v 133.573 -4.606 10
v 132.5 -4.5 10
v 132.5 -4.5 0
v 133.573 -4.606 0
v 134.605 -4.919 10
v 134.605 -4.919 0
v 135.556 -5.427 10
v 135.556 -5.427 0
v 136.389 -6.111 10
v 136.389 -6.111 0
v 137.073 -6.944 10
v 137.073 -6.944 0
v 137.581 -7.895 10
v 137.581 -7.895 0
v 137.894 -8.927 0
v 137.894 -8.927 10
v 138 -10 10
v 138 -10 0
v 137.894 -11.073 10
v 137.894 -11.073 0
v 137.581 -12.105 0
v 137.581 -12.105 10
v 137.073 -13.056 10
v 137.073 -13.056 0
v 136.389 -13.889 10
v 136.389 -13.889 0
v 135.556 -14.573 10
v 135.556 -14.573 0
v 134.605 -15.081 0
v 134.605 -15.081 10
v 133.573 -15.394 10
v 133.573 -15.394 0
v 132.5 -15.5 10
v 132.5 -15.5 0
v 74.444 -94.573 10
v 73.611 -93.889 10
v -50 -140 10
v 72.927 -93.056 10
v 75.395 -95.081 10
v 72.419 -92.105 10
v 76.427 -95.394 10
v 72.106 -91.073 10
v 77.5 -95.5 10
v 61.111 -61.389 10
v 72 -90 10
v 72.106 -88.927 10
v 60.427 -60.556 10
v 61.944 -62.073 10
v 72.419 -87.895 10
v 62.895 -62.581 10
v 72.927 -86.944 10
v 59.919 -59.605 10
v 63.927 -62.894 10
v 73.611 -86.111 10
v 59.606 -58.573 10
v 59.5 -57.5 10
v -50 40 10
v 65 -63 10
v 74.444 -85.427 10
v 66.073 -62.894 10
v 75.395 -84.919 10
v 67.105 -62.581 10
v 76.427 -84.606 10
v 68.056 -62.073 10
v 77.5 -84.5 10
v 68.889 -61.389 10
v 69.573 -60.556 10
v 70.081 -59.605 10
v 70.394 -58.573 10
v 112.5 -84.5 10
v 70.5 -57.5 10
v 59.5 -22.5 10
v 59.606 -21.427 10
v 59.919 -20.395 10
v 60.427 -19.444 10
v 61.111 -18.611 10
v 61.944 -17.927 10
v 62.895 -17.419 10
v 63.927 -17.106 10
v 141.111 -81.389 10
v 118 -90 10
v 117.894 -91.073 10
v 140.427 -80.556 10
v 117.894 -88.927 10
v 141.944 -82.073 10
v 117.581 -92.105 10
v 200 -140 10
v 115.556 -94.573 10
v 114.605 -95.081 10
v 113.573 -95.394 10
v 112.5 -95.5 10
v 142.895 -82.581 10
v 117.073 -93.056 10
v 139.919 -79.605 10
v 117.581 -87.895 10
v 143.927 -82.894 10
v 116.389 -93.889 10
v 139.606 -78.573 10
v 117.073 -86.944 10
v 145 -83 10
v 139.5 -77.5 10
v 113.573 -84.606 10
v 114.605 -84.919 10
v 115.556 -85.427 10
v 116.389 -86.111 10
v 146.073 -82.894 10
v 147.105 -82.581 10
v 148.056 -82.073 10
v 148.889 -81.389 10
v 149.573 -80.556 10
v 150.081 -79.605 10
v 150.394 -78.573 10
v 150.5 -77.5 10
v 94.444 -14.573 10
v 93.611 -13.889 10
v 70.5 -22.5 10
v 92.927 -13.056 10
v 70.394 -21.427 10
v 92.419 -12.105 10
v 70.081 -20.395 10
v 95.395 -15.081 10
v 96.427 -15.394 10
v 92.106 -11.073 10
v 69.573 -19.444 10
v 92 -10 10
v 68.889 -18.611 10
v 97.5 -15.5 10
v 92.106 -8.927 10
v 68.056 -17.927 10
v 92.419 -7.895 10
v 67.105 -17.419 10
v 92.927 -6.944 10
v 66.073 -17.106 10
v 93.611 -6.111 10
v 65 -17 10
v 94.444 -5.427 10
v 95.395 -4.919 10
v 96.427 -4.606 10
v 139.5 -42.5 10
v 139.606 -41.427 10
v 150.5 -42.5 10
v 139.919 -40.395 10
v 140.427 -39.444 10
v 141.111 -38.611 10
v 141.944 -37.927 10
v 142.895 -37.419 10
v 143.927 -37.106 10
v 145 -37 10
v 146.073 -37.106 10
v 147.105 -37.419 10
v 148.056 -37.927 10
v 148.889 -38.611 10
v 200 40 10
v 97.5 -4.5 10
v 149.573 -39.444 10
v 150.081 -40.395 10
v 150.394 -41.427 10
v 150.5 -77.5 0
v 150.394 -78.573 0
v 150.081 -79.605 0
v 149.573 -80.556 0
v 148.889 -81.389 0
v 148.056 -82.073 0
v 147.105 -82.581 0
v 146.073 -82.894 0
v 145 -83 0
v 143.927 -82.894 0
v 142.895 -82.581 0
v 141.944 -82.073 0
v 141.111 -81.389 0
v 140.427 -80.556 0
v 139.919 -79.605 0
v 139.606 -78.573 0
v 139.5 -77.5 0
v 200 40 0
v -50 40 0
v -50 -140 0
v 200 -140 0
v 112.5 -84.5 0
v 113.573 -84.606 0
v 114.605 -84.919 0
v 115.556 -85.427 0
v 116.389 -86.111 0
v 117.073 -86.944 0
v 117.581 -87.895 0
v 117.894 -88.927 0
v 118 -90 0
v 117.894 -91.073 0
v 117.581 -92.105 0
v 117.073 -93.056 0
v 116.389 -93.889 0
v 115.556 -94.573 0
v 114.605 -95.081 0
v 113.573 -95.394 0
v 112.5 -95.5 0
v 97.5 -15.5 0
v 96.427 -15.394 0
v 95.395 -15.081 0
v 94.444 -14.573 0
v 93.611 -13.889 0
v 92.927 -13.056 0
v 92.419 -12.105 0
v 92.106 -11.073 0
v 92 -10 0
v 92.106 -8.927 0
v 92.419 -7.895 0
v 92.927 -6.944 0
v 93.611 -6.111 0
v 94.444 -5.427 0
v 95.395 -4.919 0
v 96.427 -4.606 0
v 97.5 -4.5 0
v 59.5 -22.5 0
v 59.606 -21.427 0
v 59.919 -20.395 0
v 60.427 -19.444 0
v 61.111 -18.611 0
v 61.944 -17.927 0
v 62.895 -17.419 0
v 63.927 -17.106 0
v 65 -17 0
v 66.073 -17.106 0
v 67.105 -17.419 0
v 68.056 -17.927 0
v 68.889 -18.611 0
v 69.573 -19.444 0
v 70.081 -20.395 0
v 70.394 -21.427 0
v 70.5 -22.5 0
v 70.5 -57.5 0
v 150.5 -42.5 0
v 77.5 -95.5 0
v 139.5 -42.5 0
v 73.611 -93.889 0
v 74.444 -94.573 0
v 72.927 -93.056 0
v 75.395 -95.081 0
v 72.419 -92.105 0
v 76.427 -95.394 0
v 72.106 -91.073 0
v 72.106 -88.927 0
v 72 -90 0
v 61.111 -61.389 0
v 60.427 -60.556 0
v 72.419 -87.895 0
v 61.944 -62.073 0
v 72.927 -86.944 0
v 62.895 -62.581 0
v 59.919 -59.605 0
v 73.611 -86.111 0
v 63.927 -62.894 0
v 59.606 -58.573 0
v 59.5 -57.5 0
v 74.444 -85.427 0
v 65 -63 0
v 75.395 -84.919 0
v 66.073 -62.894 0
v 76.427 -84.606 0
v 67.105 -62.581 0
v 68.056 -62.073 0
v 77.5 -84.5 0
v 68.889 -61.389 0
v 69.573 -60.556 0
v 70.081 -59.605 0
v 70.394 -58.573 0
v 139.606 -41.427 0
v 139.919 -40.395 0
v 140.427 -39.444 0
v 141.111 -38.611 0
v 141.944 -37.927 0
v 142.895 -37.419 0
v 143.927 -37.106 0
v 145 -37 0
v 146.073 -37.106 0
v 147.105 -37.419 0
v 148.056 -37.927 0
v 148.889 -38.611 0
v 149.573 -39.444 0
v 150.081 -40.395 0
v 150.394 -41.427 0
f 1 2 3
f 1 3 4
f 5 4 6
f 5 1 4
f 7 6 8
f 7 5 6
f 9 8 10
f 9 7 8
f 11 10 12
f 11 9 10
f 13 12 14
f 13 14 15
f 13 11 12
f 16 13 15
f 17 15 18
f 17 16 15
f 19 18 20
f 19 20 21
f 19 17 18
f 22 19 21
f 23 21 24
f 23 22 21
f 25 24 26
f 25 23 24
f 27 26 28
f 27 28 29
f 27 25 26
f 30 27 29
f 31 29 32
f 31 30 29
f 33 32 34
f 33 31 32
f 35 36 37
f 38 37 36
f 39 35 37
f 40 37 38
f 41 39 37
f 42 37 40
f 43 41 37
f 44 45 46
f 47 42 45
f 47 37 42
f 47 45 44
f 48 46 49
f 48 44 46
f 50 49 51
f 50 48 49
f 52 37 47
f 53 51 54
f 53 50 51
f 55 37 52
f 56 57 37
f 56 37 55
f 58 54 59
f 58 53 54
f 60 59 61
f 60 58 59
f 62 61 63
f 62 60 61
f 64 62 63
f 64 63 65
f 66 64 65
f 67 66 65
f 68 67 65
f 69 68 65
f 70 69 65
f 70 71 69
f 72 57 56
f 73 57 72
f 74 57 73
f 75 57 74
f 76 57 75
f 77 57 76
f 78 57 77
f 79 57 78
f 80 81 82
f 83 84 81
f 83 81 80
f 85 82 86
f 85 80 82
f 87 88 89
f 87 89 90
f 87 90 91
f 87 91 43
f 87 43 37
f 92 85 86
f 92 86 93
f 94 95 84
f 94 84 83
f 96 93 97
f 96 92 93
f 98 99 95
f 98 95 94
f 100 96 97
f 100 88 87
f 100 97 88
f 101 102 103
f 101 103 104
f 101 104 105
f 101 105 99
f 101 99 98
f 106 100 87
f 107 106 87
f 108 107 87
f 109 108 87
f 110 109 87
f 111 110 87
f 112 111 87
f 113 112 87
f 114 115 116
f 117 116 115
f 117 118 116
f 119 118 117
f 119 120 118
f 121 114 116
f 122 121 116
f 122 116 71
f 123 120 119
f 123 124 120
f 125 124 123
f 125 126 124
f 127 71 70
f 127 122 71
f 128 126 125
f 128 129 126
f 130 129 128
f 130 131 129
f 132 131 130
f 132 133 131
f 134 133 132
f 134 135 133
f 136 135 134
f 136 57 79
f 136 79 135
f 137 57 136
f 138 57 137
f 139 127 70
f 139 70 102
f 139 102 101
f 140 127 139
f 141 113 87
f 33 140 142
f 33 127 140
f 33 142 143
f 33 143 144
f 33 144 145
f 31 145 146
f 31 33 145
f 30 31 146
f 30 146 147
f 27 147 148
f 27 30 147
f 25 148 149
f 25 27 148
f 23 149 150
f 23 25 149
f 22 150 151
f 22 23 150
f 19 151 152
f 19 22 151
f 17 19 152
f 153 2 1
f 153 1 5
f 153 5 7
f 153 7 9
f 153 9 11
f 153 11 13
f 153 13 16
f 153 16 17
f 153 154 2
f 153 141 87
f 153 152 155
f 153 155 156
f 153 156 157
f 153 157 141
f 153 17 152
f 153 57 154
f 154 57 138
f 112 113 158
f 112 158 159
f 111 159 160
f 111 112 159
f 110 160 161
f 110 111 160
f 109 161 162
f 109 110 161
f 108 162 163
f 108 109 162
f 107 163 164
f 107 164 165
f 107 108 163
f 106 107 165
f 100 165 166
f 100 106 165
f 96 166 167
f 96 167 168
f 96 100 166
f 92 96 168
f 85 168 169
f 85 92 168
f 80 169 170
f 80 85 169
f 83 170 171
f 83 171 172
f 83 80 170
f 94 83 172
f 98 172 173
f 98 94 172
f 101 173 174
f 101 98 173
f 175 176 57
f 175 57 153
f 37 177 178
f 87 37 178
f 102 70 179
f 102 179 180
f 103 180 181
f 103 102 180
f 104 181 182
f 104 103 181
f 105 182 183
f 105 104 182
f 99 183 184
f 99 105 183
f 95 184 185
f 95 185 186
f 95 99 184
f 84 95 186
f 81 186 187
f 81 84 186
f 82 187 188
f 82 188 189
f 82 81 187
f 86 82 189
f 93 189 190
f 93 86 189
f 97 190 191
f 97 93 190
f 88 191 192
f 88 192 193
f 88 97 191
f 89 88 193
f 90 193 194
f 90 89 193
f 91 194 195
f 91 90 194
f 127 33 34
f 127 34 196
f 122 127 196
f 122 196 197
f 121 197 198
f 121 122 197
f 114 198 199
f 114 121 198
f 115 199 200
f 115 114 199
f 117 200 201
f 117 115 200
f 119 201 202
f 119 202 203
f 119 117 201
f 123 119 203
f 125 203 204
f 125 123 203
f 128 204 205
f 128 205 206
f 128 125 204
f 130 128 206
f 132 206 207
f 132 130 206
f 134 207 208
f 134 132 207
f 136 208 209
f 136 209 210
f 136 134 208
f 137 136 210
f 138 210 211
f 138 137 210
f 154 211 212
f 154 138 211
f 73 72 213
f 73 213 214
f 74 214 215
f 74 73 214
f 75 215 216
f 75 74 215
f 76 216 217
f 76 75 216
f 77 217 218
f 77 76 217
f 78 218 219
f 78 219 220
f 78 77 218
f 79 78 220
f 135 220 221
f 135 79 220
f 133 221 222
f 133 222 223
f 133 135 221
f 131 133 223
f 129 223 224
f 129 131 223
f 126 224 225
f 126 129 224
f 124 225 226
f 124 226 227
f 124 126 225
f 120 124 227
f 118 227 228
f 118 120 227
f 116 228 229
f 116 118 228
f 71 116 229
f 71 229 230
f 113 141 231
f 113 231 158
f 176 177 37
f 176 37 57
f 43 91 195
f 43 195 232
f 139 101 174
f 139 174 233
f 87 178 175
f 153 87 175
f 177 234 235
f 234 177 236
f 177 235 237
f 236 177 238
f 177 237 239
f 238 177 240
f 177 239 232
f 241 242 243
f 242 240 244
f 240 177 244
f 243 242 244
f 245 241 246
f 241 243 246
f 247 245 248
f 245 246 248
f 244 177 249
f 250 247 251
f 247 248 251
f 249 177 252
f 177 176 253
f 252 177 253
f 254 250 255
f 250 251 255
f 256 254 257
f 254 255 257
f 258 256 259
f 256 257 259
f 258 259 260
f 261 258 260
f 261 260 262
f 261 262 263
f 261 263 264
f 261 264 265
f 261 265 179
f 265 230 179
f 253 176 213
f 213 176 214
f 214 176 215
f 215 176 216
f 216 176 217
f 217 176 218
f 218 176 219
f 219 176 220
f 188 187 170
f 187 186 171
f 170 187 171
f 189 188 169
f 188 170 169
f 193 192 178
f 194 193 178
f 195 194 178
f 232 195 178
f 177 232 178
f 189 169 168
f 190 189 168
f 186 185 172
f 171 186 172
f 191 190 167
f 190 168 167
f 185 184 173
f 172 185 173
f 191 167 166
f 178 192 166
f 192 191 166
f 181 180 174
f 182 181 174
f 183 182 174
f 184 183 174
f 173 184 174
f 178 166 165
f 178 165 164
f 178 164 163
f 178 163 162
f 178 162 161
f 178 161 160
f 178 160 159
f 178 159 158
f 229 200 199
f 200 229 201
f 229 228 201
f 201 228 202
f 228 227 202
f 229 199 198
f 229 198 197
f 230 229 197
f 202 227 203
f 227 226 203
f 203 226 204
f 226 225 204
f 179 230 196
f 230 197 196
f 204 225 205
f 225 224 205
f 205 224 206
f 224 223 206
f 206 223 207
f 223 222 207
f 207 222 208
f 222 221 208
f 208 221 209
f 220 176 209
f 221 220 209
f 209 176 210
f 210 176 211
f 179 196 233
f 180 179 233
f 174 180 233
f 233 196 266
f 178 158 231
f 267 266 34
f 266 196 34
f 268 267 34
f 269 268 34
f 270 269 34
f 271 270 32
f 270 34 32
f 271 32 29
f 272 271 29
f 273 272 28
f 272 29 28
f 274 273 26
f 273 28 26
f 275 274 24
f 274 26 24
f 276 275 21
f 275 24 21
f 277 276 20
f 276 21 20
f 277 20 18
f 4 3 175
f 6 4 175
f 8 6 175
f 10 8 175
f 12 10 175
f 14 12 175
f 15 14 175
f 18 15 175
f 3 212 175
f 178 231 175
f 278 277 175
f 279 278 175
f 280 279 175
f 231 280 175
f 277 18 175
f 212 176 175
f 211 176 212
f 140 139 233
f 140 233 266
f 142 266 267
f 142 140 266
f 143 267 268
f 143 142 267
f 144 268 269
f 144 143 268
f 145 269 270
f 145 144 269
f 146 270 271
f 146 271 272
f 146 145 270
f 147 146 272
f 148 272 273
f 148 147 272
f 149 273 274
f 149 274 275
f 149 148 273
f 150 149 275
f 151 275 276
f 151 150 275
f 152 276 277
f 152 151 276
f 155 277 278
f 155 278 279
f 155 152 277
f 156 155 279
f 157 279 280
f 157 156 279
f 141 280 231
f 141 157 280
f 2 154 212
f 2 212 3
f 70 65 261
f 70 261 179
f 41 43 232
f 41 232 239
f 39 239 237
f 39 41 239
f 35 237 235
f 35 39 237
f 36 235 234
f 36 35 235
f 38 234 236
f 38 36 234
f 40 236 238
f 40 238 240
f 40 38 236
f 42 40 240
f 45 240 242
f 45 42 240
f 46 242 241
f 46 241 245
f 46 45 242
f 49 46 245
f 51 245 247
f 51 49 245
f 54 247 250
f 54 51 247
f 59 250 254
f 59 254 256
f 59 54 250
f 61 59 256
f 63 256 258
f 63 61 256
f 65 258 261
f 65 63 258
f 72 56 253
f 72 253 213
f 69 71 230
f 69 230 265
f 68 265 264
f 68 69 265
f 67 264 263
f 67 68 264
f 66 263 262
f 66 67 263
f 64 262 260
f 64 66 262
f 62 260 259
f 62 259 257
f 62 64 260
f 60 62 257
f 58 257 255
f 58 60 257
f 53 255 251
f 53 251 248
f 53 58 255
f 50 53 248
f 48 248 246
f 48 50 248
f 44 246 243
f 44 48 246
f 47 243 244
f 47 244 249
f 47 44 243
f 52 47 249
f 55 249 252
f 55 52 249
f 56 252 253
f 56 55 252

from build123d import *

# Parameters (mm, degrees)
SKETCH1_W           = 250
SKETCH1_H           = 180
BOSS_EXTRUDE1_DEPTH = 10
CUT_EXTRUDE1_DEPTH  = 10
CIRPATTERN1_COUNT   = 4


with BuildPart() as part:
    # Sketch1 → Boss-Extrude1 (new body)
    with BuildSketch(Plane.XY):
        with Locations((75, -50)):
            Rectangle(SKETCH1_W, SKETCH1_H)
    extrude(amount=BOSS_EXTRUDE1_DEPTH)

    # Sketch2 → Cut-Extrude1 (cut)
    with BuildSketch(Plane.XY.offset(10)):
        with BuildLine():
            Line((70.5, -22.5), (70.5, -57.5))
            ThreePointArc((70.5, -57.5), (65, -63), (59.5, -57.5))
            Line((59.5, -57.5), (59.5, -22.5))
            ThreePointArc((59.5, -22.5), (65, -17), (70.5, -22.5))
        make_face()
    cut_extrude1 = extrude(amount=-CUT_EXTRUDE1_DEPTH, mode=Mode.SUBTRACT)

    # CirPattern1: Cut-Extrude1 ×4 about axis
    cirpattern1_axis = Axis((105, -50, 0), (0, 0, 1))
    for i in range(1, CIRPATTERN1_COUNT):
        add(cut_extrude1.rotate(cirpattern1_axis, i * 360 / CIRPATTERN1_COUNT), mode=Mode.SUBTRACT)


solid = part.part
